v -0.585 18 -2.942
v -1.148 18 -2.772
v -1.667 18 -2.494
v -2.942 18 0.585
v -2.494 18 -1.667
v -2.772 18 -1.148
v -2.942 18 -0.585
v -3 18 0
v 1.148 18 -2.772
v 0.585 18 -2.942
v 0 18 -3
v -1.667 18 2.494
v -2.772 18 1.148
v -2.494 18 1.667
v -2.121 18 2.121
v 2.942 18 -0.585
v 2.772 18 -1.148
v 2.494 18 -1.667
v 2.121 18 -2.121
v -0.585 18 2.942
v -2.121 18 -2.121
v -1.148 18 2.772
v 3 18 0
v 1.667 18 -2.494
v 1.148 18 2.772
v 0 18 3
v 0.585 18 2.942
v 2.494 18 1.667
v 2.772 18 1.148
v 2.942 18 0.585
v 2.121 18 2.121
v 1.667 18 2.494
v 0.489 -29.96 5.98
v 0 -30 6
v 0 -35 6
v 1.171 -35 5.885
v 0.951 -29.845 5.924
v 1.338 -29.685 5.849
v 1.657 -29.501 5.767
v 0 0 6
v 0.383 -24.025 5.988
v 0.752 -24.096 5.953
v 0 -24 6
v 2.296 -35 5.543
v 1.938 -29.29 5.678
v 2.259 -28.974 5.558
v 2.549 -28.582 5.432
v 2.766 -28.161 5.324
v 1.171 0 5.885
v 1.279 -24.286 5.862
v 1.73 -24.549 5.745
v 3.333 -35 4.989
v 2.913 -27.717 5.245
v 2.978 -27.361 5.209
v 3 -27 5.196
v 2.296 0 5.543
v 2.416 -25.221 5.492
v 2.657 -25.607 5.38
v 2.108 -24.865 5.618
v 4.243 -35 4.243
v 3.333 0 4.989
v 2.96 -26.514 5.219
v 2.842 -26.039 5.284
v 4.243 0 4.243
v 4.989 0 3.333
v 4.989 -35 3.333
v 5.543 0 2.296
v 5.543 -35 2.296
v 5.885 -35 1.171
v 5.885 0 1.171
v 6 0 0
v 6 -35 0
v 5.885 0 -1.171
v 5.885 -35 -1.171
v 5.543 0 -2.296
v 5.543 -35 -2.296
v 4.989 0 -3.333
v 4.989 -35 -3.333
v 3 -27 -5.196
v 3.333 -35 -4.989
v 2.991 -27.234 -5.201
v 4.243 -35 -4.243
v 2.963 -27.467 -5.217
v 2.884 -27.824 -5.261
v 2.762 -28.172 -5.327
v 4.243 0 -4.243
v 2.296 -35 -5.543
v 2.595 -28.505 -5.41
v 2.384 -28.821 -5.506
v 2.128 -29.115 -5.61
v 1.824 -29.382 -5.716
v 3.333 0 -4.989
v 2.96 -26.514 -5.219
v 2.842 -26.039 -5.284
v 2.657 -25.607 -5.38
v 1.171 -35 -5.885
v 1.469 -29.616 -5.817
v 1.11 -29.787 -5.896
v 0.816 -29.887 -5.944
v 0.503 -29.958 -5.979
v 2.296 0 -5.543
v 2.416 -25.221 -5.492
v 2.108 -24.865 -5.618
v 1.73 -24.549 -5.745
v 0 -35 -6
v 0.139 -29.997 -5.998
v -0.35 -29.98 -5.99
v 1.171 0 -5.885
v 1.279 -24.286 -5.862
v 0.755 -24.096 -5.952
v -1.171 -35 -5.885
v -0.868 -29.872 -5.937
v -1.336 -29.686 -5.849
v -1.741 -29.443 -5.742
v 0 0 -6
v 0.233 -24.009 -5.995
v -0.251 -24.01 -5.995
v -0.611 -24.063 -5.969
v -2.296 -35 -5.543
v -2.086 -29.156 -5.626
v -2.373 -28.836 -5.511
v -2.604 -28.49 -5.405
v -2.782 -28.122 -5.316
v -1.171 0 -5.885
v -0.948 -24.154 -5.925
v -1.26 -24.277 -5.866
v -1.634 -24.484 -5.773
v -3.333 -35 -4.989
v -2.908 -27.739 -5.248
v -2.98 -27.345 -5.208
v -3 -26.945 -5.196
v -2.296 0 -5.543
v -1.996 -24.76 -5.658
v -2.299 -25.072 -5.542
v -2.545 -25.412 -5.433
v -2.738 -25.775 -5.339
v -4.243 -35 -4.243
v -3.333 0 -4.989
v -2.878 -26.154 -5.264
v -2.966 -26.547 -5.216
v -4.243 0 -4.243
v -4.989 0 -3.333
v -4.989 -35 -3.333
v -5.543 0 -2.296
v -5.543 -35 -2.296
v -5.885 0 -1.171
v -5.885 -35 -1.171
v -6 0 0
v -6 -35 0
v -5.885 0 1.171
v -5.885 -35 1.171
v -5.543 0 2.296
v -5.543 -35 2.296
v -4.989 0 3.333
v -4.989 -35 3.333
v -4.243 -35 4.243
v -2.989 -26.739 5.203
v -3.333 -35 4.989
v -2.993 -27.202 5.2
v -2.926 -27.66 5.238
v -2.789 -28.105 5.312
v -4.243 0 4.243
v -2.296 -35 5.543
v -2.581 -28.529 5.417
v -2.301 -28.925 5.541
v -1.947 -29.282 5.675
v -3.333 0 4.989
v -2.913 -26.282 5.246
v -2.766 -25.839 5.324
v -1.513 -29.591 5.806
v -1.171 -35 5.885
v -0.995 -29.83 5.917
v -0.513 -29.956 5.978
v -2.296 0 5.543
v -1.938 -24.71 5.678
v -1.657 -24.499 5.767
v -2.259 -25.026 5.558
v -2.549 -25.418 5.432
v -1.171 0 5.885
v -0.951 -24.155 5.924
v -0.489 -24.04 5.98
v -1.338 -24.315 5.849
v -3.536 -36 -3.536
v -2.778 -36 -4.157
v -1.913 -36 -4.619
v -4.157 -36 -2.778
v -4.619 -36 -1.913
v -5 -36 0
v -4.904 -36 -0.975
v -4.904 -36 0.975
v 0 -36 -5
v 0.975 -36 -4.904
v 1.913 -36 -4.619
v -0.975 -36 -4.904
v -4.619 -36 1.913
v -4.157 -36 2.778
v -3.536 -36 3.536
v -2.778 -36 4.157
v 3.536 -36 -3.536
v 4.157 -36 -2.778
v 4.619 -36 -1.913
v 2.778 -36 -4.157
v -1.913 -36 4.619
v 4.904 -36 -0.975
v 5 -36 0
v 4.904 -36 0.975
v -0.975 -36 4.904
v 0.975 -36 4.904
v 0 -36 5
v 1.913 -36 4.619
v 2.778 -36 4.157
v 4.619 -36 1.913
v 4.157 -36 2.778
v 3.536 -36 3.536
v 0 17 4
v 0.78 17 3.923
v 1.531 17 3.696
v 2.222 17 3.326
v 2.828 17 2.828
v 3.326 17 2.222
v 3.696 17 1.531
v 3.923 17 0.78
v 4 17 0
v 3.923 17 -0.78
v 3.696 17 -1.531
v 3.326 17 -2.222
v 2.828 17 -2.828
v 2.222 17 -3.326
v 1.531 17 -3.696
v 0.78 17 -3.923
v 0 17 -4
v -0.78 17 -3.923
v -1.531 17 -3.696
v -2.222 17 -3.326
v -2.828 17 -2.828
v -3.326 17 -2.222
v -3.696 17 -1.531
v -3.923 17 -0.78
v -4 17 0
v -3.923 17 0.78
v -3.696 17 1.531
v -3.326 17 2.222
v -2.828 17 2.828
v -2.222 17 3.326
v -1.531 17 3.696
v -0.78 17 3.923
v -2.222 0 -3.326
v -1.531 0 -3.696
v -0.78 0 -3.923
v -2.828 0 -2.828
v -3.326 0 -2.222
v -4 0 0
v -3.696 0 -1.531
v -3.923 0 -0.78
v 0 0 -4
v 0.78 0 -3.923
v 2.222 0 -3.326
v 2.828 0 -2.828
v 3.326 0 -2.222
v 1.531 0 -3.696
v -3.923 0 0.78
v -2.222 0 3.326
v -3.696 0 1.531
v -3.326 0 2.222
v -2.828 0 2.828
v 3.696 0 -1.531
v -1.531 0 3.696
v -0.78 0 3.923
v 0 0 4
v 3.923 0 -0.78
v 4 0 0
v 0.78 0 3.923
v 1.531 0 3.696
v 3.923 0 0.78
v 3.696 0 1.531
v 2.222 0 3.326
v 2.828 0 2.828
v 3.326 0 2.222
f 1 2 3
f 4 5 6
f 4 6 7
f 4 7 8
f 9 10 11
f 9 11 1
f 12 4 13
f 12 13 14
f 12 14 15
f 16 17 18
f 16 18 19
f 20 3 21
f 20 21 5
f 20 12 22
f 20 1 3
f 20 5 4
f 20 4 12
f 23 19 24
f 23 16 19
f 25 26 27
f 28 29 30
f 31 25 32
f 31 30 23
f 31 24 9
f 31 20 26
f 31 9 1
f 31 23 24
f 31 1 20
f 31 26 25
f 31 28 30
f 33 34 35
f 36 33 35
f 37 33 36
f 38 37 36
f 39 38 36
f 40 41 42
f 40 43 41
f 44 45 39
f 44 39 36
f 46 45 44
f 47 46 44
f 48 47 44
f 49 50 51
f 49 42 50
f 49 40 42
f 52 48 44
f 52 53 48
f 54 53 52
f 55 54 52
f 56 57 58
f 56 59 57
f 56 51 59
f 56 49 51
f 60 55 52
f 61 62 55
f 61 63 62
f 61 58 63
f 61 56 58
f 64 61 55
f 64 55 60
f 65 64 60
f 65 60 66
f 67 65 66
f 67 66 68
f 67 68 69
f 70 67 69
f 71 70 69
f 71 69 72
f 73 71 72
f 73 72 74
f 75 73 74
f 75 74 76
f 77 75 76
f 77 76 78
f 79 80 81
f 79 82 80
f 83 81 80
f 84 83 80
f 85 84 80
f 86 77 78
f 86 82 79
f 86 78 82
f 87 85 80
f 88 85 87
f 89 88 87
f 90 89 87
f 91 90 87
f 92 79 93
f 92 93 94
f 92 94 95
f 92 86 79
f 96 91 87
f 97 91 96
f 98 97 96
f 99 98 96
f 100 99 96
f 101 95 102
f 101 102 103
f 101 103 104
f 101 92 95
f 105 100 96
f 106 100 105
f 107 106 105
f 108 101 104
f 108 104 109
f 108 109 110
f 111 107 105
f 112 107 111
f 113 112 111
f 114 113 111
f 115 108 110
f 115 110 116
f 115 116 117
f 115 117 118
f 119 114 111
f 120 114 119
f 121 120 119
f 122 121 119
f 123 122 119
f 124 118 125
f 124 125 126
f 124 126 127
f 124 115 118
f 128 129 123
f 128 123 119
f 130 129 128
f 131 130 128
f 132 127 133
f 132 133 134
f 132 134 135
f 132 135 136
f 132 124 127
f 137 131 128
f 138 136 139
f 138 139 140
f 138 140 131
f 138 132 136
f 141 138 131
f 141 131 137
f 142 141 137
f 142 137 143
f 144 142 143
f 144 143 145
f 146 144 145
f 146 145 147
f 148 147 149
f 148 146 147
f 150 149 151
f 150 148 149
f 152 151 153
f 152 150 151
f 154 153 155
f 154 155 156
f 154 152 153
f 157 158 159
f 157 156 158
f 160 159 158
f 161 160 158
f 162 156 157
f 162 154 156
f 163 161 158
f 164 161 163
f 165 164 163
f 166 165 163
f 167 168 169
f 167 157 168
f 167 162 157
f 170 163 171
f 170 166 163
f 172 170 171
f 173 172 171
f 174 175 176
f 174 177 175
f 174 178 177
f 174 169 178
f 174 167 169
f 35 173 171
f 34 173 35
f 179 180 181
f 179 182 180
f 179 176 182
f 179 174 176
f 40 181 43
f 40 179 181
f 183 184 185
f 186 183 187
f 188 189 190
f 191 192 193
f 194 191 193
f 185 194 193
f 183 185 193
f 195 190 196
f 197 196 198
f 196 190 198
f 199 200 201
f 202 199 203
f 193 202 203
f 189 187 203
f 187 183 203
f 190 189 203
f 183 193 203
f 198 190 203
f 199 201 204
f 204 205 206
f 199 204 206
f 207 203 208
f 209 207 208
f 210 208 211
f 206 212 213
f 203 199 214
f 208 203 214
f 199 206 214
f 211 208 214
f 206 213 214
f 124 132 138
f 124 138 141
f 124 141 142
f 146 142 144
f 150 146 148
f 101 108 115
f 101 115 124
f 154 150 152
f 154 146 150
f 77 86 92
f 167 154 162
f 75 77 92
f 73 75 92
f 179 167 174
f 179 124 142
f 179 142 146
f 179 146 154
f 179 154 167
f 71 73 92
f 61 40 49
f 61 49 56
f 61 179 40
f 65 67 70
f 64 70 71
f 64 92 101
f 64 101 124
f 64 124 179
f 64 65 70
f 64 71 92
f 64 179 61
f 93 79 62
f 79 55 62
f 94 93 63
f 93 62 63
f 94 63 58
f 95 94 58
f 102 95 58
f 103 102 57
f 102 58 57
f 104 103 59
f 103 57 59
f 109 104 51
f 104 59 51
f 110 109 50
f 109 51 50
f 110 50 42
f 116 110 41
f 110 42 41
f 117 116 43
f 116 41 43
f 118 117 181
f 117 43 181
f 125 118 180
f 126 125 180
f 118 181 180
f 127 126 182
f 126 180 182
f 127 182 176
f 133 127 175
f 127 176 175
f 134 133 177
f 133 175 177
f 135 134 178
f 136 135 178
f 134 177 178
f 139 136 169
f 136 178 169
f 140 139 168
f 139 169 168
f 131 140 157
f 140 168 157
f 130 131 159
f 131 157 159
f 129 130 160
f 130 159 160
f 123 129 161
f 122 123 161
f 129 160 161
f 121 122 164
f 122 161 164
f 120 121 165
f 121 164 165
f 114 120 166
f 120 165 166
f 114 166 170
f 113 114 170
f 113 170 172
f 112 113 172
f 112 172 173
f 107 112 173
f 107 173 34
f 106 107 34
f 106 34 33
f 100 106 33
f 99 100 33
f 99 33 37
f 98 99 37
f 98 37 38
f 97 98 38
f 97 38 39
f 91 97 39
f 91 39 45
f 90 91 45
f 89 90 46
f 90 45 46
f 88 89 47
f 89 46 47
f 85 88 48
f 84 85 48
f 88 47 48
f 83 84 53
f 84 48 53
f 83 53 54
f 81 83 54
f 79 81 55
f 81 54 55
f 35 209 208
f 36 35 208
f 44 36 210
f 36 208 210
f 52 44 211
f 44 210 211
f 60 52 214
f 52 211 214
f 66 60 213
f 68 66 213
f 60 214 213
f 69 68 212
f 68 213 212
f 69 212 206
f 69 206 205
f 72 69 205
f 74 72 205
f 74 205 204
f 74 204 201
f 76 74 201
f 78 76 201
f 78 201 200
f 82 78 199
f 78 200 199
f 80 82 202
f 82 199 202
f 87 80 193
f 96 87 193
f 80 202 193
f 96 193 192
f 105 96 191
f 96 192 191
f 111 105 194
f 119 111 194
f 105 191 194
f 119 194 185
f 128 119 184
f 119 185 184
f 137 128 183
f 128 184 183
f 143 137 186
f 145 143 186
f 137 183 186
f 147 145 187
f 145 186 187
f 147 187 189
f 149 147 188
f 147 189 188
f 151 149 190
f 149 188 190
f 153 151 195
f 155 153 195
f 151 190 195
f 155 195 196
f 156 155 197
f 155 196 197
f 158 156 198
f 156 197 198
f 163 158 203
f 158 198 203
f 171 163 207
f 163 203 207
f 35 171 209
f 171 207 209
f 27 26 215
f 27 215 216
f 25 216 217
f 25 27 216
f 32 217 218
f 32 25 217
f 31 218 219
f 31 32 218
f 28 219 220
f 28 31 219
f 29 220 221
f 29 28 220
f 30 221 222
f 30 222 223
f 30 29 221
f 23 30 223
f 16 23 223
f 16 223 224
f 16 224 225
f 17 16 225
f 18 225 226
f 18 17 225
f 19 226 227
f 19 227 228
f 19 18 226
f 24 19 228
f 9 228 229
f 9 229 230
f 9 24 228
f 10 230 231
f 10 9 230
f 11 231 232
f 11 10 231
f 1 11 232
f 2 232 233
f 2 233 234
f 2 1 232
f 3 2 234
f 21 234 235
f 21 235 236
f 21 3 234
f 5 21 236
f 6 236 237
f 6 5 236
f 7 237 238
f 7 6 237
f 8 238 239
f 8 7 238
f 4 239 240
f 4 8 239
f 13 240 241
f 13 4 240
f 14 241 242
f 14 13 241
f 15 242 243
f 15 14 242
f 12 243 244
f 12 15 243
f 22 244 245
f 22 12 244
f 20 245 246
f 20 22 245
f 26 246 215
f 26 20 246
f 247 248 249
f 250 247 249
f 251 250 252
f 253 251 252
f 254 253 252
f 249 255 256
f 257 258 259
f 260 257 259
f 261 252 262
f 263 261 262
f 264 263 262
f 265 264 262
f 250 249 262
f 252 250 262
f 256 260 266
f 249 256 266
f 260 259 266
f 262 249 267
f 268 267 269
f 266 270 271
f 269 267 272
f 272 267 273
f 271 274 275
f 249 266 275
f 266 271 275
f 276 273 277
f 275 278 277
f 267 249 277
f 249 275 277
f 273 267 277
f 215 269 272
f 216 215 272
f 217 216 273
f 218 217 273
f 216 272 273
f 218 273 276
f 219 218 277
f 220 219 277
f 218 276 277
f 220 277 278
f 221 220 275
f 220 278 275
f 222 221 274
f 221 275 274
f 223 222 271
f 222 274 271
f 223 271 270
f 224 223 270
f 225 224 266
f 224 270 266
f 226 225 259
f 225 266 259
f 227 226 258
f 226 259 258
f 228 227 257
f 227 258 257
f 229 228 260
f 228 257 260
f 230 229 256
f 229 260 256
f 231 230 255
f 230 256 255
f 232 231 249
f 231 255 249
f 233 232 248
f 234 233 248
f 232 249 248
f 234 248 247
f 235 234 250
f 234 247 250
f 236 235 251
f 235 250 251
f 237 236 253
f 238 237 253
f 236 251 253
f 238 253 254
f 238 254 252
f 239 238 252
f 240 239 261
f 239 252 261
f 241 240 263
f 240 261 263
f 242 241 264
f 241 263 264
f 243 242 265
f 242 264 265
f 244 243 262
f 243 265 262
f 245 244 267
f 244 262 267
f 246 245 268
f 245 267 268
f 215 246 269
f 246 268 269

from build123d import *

# Parameters (mm, degrees)
SKETCH1_R           = 4
BOSS_EXTRUDE1_DEPTH = 18
SKETCH1_3_R         = 6
BOSS_EXTRUDE2_DEPTH = 36
SKETCH2_R           = 3
CUT_EXTRUDE1_DEPTH  = 18
CHAMFER1_SIZE       = 1
CHAMFER2_SIZE       = 1


with BuildPart() as part:
    # Sketch1 → Boss-Extrude1 (new body)
    with BuildSketch(Plane(origin=(0, 0, 0), x_dir=(1, 0, 0), z_dir=(0, 1, 0))):
        Circle(SKETCH1_R)
    extrude(amount=BOSS_EXTRUDE1_DEPTH)

    # Chamfer1
    chamfer1_edges = [part.edges().sort_by_distance(p)[0] for p in [
        (-4, 18, 0),
    ]]
    chamfer(chamfer1_edges, length=CHAMFER1_SIZE)


with BuildPart() as body_2:
    # Sketch1<3> → Boss-Extrude2 (new body)
    with BuildSketch(Plane(origin=(0, 0, 0), x_dir=(1, 0, 0), z_dir=(0, 1, 0))):
        Circle(SKETCH1_3_R)
    extrude(amount=-BOSS_EXTRUDE2_DEPTH)

    # Sketch2 → Cut-Extrude1 (cut, symmetric)
    with BuildSketch(Plane.XY):
        with Locations((0, -27)):
            Circle(SKETCH2_R)
    extrude(amount=CUT_EXTRUDE1_DEPTH, both=True, mode=Mode.SUBTRACT)

    # Chamfer2
    chamfer2_edges = [body_2.edges().sort_by_distance(p)[0] for p in [
        (-6, -36, 0),
    ]]
    chamfer(chamfer2_edges, length=CHAMFER2_SIZE)


solid = Compound([part.part, body_2.part])
